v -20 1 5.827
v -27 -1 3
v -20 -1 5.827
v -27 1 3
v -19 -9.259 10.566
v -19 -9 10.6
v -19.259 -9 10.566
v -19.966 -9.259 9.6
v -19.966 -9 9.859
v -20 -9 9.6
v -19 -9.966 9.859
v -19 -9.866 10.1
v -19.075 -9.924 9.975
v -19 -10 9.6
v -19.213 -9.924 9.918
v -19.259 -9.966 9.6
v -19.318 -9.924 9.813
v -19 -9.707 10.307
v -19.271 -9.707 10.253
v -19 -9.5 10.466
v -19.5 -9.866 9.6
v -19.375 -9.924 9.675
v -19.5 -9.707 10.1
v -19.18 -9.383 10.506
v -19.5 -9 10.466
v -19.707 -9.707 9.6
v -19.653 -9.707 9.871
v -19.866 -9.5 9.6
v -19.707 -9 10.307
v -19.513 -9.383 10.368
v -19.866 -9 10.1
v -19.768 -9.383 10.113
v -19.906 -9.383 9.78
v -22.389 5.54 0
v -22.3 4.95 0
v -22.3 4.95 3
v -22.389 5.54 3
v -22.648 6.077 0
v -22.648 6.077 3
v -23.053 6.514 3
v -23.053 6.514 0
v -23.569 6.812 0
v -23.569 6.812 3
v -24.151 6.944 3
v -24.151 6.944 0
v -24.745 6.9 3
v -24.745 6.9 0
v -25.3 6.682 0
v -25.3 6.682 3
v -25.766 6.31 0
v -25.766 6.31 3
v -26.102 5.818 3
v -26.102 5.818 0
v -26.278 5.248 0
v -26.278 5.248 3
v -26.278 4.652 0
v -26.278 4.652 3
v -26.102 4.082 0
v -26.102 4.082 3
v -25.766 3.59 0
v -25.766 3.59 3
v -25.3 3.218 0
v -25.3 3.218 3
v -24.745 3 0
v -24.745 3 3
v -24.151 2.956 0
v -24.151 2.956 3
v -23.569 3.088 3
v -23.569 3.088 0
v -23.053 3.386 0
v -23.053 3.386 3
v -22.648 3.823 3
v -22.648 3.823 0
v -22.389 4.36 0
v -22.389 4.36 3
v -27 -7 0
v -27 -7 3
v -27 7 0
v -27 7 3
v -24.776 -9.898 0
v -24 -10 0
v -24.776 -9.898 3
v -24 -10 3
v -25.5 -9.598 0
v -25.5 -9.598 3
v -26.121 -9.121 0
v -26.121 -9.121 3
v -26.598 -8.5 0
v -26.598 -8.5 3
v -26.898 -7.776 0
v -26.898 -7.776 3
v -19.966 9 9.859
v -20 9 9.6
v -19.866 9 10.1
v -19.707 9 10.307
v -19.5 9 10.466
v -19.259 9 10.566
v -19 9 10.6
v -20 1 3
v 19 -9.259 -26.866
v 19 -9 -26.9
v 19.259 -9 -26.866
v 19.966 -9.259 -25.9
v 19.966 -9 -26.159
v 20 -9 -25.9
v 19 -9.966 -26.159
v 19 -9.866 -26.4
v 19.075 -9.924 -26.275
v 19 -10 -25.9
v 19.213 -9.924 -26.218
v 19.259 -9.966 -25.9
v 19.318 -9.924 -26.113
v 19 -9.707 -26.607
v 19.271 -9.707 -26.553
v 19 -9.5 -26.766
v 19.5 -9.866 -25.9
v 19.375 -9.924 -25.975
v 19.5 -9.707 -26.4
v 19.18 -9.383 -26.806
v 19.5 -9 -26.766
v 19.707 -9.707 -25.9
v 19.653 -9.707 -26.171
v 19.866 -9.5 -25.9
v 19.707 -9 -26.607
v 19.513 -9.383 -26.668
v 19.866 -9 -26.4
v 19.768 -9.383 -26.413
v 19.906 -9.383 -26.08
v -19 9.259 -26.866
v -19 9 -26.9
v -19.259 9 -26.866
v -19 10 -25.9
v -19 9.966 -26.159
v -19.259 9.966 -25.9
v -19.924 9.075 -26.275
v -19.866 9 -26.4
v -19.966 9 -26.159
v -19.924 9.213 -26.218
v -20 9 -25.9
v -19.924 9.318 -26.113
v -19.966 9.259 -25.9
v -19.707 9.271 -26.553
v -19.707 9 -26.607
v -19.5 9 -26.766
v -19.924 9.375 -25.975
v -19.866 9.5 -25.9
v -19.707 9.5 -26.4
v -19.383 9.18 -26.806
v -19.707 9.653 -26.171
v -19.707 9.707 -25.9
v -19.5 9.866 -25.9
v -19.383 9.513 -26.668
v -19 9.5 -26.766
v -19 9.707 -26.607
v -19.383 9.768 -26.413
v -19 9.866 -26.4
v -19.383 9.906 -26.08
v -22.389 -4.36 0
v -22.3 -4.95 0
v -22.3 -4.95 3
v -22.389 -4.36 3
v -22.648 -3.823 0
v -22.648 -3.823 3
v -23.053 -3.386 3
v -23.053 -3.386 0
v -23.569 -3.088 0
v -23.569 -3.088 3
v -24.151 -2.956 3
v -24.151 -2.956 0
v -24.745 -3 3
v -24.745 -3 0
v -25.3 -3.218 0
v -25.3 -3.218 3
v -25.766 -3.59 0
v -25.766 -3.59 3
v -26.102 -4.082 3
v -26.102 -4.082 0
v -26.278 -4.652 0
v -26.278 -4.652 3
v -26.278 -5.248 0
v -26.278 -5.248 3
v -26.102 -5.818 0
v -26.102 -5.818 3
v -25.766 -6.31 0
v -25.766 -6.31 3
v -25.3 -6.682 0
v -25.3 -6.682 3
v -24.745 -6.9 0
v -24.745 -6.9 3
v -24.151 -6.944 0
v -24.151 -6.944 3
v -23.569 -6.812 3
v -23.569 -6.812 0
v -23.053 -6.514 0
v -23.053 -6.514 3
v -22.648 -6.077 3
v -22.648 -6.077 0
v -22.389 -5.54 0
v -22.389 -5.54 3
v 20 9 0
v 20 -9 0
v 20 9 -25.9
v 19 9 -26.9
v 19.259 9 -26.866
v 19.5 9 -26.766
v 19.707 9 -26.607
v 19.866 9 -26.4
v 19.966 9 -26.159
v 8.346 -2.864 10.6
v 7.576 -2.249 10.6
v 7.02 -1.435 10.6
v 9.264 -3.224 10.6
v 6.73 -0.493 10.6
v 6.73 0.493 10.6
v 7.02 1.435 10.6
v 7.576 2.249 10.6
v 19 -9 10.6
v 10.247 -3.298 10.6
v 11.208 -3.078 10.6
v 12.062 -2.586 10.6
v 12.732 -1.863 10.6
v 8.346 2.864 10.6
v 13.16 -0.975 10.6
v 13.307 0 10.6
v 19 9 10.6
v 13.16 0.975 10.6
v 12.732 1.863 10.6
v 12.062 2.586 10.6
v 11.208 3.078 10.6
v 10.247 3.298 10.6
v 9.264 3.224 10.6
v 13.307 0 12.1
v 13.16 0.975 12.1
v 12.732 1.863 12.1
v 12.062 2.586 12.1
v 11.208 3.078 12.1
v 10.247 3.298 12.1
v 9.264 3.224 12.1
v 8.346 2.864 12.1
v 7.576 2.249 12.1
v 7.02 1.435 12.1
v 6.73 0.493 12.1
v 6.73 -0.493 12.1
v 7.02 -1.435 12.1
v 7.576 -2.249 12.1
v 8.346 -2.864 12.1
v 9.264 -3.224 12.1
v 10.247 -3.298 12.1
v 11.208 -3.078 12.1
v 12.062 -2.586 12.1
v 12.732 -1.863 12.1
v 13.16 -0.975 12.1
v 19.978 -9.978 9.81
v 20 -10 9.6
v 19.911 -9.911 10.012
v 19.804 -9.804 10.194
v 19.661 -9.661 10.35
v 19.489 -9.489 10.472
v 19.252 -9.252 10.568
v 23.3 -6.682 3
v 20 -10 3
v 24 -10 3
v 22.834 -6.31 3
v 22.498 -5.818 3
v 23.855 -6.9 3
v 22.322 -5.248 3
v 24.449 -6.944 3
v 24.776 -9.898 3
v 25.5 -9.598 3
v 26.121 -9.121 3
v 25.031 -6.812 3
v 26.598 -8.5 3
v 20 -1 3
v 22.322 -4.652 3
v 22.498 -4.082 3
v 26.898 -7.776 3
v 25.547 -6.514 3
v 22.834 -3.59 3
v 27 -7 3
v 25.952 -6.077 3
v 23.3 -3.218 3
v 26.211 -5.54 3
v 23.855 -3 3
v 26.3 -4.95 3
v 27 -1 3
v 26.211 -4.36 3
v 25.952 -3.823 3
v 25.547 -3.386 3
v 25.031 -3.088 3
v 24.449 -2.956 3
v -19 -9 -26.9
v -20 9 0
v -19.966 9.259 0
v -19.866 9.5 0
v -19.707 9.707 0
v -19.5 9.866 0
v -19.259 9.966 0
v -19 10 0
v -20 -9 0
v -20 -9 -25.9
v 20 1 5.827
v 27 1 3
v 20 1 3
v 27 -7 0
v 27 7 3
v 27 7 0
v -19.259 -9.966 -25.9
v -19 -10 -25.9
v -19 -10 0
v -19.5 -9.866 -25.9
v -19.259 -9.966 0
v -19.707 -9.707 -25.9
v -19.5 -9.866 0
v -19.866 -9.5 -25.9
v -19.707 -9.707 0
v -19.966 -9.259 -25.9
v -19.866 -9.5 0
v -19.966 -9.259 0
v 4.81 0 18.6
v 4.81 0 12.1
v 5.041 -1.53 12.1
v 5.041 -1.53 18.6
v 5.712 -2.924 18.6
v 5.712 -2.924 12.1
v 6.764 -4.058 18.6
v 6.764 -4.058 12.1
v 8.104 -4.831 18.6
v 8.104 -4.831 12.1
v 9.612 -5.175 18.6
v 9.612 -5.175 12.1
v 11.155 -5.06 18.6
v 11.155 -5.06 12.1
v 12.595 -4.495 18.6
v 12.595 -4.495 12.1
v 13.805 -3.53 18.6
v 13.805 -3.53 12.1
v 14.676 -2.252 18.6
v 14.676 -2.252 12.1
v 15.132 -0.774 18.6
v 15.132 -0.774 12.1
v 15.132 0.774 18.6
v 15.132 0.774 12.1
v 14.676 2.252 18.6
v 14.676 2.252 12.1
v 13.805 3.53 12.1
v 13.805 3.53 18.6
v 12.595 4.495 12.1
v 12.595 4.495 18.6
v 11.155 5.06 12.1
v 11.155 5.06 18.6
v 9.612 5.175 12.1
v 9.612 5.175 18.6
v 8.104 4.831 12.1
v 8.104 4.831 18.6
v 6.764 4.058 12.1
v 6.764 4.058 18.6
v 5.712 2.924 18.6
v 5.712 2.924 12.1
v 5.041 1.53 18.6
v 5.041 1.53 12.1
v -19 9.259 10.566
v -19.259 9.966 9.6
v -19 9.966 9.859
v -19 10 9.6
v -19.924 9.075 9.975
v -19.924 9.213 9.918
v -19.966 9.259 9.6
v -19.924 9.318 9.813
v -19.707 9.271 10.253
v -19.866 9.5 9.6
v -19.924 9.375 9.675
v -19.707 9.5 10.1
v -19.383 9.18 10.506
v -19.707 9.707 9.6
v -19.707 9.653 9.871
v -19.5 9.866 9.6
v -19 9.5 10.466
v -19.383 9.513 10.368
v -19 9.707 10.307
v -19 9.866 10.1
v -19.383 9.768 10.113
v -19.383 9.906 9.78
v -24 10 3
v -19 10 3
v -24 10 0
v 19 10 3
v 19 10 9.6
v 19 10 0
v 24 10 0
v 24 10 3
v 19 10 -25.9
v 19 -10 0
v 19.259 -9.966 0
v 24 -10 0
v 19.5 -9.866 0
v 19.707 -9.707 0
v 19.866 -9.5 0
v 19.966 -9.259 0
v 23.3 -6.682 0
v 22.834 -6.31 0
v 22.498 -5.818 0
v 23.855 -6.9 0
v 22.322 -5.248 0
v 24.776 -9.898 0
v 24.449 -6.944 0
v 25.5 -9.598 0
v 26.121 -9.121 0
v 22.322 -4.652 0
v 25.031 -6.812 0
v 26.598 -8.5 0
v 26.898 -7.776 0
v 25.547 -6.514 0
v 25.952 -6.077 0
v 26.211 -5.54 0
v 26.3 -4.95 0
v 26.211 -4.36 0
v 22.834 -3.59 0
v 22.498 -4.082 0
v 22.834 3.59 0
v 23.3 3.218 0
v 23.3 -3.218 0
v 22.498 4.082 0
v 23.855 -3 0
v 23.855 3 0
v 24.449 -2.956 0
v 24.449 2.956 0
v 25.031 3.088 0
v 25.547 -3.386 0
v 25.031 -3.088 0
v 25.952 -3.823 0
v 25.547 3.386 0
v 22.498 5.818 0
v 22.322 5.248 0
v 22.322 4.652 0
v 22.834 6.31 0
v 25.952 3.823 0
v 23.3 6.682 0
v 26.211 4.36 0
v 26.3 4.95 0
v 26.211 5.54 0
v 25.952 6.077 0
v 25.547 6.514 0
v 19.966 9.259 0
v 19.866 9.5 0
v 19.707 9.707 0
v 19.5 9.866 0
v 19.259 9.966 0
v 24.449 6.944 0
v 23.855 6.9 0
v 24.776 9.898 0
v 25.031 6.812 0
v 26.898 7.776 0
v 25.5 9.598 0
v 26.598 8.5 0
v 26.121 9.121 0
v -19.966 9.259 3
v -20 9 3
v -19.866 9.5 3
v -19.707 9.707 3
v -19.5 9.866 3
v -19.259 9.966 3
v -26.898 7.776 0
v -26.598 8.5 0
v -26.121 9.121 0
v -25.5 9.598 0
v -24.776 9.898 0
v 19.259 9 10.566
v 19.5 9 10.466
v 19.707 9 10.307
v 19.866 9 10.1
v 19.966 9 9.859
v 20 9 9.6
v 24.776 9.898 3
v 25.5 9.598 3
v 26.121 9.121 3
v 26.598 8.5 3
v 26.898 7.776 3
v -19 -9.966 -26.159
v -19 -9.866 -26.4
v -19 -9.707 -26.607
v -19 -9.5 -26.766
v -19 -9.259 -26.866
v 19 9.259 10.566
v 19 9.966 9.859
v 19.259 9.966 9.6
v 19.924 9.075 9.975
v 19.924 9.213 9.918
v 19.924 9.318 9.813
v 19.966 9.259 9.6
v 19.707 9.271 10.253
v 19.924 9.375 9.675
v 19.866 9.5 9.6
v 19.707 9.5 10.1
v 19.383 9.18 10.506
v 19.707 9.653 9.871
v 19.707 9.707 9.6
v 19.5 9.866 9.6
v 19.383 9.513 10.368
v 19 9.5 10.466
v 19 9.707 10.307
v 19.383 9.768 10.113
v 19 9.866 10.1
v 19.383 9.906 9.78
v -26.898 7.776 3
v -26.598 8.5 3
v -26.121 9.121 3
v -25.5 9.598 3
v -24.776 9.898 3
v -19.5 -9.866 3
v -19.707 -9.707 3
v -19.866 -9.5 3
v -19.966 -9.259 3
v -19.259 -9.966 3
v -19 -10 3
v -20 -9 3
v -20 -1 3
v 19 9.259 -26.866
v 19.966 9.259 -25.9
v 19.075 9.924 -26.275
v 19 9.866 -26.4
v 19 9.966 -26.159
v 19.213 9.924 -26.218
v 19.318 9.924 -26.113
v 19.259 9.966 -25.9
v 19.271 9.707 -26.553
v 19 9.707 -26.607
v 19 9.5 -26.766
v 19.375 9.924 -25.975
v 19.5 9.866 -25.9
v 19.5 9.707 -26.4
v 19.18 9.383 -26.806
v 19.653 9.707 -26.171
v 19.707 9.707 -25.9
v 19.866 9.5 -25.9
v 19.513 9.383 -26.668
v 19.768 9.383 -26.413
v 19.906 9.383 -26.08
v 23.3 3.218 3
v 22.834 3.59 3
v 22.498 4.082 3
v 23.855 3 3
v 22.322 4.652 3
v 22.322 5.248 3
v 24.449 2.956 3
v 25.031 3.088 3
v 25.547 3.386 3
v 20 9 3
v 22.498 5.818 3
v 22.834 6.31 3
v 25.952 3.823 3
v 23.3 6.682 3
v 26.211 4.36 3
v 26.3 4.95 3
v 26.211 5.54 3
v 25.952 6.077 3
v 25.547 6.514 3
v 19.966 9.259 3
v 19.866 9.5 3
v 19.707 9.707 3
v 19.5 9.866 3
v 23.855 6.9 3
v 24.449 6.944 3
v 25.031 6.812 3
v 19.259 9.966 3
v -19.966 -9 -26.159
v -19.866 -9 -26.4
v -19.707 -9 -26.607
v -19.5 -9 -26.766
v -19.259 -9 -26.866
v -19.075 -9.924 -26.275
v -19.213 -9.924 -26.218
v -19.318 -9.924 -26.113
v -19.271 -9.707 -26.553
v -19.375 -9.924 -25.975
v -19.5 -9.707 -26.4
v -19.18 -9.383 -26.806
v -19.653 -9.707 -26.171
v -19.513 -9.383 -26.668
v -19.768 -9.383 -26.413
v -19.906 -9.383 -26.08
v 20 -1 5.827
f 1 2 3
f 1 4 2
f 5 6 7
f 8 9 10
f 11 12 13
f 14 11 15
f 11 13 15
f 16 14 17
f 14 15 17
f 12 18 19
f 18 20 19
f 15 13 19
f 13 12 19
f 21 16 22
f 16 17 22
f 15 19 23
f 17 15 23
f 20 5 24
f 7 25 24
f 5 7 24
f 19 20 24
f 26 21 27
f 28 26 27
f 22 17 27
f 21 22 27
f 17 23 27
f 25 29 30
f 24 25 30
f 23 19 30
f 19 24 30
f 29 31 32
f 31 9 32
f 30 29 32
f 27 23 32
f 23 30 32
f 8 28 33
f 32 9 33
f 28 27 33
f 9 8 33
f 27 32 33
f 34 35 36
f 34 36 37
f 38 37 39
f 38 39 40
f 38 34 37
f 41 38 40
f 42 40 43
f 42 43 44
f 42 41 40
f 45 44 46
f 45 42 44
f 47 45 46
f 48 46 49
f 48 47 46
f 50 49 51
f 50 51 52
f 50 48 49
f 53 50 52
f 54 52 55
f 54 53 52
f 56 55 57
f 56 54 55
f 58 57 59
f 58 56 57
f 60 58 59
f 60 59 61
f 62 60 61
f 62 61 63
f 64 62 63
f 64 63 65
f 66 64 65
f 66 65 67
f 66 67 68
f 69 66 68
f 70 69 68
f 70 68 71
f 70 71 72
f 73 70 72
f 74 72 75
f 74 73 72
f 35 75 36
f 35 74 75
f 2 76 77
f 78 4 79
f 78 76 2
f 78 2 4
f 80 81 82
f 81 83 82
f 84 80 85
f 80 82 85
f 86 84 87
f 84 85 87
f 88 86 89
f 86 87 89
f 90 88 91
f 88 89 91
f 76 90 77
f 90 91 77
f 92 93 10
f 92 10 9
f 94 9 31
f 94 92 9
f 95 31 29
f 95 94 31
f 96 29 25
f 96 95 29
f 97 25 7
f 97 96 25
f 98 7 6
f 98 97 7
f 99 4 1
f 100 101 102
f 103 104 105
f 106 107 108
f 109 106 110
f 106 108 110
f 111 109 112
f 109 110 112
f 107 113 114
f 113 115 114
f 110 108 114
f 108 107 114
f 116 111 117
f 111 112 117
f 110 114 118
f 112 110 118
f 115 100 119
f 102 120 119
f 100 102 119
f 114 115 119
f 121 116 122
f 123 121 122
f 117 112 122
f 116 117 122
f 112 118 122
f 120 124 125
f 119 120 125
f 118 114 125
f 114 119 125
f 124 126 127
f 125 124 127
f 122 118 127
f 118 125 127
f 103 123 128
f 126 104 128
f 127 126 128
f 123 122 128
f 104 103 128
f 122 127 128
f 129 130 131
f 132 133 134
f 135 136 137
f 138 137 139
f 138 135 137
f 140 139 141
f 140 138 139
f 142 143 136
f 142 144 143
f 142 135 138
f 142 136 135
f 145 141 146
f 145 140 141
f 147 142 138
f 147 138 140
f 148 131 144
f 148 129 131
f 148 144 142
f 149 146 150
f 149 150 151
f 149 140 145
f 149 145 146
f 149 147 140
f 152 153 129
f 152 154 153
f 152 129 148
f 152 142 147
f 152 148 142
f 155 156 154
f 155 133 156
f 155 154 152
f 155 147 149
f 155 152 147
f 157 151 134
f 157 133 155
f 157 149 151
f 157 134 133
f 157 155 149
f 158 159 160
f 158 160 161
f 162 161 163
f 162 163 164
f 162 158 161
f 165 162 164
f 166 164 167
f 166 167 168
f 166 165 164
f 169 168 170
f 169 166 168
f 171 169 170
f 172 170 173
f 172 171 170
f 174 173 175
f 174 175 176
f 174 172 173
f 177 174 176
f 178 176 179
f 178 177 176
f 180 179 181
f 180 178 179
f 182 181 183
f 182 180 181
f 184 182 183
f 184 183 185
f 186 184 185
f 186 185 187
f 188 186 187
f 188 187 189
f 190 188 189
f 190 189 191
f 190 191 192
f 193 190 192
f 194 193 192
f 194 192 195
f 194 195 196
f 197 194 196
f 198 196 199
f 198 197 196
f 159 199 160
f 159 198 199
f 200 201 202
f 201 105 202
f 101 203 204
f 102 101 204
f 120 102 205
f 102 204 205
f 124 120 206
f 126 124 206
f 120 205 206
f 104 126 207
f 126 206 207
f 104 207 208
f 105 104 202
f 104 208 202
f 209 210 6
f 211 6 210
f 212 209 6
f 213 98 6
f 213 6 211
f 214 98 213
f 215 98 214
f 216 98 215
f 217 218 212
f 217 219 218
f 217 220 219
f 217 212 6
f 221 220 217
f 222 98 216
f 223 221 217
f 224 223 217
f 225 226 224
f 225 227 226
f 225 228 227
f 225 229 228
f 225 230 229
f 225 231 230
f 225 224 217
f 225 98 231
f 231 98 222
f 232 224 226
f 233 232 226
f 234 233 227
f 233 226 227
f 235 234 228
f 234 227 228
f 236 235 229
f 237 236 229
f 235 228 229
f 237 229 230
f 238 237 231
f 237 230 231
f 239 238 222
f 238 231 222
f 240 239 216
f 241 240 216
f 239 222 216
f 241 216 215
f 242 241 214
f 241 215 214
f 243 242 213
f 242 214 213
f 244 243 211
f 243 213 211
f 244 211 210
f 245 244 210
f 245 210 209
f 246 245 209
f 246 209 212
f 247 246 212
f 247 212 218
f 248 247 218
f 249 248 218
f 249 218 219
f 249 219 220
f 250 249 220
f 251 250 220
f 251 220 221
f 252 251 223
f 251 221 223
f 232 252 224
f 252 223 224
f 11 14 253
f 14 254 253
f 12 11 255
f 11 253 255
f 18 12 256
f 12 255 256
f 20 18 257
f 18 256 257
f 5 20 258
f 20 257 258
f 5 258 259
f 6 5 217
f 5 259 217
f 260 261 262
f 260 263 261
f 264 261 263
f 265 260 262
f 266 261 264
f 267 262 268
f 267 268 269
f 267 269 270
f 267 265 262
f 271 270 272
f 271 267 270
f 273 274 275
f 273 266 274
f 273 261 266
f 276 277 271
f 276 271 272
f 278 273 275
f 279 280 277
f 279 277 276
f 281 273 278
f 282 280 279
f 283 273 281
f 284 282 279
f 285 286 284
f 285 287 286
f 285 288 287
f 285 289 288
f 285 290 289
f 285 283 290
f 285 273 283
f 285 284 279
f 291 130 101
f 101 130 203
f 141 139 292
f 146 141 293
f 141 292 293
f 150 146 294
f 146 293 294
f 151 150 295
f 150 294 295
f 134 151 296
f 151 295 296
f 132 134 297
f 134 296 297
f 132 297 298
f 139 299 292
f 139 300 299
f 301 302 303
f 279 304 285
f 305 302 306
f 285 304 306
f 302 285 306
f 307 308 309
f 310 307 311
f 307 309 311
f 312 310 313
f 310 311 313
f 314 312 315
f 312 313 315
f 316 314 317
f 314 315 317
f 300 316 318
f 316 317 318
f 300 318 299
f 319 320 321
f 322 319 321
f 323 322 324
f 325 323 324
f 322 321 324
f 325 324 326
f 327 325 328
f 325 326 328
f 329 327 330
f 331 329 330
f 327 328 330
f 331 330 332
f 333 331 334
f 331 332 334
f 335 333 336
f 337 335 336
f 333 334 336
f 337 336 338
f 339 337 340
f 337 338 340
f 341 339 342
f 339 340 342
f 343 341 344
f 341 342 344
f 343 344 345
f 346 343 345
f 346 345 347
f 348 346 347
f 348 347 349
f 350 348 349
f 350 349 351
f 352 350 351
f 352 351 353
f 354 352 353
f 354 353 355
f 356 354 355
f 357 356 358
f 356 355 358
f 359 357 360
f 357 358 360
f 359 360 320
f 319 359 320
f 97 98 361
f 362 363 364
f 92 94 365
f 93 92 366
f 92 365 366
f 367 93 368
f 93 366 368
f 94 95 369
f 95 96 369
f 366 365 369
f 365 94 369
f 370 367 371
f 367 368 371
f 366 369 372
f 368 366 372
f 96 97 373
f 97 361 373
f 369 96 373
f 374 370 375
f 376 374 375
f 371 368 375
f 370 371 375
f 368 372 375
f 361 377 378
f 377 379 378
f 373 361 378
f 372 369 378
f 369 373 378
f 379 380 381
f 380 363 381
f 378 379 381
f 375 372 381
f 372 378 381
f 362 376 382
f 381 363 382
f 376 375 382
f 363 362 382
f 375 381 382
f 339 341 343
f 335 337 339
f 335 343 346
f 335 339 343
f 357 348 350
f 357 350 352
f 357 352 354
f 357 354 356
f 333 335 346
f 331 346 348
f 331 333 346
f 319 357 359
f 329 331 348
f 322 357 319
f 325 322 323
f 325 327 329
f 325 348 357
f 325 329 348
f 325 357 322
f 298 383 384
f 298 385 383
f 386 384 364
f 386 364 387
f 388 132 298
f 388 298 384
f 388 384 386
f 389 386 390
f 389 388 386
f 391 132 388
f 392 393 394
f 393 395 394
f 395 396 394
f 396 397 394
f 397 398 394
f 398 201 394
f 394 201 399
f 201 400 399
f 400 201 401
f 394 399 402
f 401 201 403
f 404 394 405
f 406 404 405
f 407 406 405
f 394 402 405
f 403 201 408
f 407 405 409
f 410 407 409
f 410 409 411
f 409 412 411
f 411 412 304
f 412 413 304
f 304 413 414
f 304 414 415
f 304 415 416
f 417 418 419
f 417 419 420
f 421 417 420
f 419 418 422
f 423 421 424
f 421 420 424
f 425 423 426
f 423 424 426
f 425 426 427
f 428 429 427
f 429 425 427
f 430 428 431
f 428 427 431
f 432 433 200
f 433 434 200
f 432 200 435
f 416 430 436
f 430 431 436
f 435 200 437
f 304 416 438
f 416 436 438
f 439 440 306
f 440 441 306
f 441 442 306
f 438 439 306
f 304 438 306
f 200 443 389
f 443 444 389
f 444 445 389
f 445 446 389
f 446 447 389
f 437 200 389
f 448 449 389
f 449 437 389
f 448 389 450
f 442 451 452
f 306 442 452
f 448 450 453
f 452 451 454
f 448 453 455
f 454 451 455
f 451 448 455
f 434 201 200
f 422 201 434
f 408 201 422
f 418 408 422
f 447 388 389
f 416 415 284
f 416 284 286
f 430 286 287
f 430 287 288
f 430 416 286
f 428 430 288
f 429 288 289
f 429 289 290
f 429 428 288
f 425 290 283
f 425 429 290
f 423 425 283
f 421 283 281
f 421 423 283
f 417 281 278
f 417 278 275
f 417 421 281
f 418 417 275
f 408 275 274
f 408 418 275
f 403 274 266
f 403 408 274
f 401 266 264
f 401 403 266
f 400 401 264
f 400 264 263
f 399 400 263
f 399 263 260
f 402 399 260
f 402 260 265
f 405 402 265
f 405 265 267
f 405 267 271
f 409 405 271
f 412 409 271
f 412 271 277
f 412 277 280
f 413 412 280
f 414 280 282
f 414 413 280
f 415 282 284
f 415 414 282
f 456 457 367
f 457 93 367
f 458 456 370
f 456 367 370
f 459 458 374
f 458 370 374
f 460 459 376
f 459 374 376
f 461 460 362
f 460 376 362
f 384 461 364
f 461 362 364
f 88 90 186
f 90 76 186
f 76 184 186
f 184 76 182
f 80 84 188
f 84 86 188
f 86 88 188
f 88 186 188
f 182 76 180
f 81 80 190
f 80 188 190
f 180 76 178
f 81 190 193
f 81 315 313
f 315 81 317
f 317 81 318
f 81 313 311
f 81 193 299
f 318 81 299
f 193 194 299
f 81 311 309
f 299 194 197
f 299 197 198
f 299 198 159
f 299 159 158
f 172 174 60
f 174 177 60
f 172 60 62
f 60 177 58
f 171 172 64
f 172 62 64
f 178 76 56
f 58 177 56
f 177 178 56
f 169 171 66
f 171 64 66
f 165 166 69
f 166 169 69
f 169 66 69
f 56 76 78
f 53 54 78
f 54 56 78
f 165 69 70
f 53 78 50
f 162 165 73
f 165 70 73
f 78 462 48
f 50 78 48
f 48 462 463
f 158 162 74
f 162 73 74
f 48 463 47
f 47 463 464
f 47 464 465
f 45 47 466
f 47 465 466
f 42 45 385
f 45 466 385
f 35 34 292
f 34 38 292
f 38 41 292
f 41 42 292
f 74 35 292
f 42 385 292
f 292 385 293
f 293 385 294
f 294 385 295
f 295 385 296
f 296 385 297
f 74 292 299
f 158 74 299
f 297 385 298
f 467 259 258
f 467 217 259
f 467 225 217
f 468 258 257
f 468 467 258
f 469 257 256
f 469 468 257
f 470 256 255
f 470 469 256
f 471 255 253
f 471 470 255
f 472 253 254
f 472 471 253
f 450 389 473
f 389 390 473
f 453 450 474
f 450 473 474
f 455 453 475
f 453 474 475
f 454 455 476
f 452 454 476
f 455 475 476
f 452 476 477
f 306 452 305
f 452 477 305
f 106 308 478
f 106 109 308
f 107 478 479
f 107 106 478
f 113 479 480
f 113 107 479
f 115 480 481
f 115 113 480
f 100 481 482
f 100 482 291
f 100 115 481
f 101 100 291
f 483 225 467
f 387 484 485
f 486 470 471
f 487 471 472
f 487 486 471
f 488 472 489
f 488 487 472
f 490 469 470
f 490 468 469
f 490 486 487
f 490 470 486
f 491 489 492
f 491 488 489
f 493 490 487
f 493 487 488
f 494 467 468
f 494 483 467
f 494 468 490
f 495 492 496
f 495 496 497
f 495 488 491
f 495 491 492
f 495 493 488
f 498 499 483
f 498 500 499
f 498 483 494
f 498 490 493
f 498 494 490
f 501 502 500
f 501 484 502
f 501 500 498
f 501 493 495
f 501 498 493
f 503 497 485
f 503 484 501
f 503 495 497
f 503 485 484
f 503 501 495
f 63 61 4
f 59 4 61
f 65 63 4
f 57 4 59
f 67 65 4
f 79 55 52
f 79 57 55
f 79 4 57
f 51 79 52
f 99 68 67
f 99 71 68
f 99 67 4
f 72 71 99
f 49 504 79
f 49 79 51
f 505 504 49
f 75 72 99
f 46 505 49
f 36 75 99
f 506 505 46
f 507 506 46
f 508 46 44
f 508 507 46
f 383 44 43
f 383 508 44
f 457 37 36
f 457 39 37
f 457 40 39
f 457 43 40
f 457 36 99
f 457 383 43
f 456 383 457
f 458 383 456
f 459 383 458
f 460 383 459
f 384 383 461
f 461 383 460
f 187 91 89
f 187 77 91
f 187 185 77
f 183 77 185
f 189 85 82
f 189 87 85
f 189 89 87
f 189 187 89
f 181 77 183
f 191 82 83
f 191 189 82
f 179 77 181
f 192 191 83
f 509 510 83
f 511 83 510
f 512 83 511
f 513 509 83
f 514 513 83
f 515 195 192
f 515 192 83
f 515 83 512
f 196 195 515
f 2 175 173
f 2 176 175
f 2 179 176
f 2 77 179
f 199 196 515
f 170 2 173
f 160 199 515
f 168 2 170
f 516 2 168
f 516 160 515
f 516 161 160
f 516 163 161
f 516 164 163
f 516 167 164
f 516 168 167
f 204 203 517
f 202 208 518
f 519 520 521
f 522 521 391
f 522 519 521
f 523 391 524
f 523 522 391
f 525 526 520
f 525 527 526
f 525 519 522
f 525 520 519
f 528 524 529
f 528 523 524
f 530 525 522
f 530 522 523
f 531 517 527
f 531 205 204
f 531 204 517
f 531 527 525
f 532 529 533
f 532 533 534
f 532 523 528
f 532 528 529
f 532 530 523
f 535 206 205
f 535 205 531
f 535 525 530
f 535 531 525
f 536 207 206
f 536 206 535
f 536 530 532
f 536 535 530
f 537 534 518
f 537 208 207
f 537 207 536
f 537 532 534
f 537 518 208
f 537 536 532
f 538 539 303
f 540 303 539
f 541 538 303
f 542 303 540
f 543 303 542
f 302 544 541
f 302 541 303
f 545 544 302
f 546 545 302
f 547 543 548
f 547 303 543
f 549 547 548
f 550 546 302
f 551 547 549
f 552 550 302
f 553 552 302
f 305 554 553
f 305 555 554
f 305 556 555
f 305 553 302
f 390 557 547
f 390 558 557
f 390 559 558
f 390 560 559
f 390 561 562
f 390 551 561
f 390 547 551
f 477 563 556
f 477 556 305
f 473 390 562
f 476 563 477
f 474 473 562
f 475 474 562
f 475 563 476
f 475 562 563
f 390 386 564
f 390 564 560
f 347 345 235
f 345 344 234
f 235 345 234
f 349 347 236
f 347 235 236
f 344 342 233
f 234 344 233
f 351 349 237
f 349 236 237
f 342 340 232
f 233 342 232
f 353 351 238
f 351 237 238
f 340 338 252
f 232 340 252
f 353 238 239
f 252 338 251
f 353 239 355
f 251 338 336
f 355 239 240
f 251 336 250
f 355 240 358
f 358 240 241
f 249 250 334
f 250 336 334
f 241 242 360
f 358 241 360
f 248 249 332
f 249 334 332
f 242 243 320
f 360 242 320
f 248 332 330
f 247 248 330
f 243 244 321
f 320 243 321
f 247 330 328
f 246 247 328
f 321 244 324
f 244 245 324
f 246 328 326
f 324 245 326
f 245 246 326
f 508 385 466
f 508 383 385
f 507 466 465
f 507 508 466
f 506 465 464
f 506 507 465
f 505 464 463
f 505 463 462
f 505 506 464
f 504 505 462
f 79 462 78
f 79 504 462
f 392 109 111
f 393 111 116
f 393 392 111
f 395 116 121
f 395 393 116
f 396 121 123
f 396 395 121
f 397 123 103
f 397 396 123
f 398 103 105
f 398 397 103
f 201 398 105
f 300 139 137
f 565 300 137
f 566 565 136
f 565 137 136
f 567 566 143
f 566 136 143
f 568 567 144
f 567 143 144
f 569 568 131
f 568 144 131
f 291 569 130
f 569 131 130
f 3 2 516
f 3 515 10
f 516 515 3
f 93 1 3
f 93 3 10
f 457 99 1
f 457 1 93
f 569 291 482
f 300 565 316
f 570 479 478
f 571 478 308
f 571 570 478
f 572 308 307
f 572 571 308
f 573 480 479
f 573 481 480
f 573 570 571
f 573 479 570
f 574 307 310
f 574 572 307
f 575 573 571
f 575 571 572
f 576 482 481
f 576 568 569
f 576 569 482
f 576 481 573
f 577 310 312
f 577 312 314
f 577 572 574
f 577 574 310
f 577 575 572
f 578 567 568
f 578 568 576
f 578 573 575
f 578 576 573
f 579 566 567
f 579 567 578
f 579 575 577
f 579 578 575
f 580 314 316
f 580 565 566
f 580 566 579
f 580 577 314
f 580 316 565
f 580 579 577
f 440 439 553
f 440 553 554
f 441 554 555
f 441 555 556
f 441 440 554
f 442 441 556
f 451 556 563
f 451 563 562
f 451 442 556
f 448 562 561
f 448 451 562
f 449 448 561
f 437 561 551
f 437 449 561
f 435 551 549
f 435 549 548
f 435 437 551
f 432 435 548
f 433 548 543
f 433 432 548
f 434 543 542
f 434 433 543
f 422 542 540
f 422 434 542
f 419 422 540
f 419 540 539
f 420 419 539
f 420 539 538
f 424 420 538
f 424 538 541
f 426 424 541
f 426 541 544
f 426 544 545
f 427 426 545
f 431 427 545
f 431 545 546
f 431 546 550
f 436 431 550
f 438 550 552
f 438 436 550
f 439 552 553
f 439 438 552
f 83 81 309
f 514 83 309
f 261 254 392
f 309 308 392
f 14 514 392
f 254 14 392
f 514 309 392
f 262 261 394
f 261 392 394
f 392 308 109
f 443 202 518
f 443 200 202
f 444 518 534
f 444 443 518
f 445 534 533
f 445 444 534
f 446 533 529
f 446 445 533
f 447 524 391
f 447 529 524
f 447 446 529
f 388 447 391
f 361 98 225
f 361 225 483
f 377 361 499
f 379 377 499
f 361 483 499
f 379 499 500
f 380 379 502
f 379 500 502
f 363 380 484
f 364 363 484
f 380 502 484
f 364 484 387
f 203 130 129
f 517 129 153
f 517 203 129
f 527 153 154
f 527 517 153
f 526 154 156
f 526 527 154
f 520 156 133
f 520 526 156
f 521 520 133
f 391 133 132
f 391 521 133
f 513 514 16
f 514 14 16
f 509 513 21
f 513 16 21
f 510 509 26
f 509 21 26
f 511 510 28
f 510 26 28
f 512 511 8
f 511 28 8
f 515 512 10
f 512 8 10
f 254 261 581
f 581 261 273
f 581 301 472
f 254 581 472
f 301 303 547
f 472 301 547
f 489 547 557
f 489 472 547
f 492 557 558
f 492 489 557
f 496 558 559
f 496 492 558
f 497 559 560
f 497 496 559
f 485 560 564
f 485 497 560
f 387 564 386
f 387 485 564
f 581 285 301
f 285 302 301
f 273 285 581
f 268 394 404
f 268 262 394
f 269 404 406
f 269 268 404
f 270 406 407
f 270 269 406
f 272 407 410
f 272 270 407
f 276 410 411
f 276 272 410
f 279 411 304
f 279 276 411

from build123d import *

# Parameters (mm, degrees)
BOSS_EXTRUDE1_DEPTH      = 10.6
BOSS_EXTRUDE1_DEPTH_BACK = 26.9
SKETCH1_W                = 40
SKETCH1_H                = 20
SKETCH1_3_W              = 40
SKETCH1_3_H              = 20
SKETCH1_3_W_2            = 7
SKETCH1_3_R              = 2
BOSS_EXTRUDE2_DEPTH      = 3
SKETCH2_R                = 3.307057182
BOSS_EXTRUDE3_DEPTH      = 1.5
BOSS_EXTRUDE4_START      = 1.5
SKETCH2_3_R              = 5.189986332
SKETCH2_3_R_2            = 3.307057182
BOSS_EXTRUDE4_DEPTH      = 6.5
FILLET1_R                = 3
FILLET2_R                = 1
BOSS_EXTRUDE6_DEPTH      = 1


with BuildPart() as part:
    # Sketch1 → Boss-Extrude1 (new, two sides: drawn at the far end of the back side and taken through both)
    with BuildSketch(Plane.XY.offset(-BOSS_EXTRUDE1_DEPTH_BACK)):
        Rectangle(SKETCH1_W, SKETCH1_H)
    extrude(amount=BOSS_EXTRUDE1_DEPTH + BOSS_EXTRUDE1_DEPTH_BACK)

    # Sketch1<3> → Boss-Extrude2 (add)
    # profile 1 of 3: a face of its own
    with BuildSketch(Plane.XY):
        Rectangle(SKETCH1_3_W, SKETCH1_3_H)
    # profile 2 of 3: a face of its own
    with BuildSketch(Plane.XY):
        with Locations((-23.5, 0)):
            Rectangle(SKETCH1_3_W_2, SKETCH1_3_H)
        with Locations((-24.3, -4.95)):
            Circle(SKETCH1_3_R, mode=Mode.SUBTRACT)
        with Locations((-24.3, 4.95)):
            Circle(SKETCH1_3_R, mode=Mode.SUBTRACT)
    # profile 3 of 3: a face of its own
    with BuildSketch(Plane.XY):
        with Locations((23.5, 0)):
            Rectangle(SKETCH1_3_W_2, SKETCH1_3_H)
        with Locations((24.3, -4.95)):
            Circle(SKETCH1_3_R, mode=Mode.SUBTRACT)
        with Locations((24.3, 4.95)):
            Circle(SKETCH1_3_R, mode=Mode.SUBTRACT)
    extrude(amount=BOSS_EXTRUDE2_DEPTH)

    # Sketch2 → Boss-Extrude3 (add)
    with BuildSketch(Plane.XY.offset(10.6)):
        with Locations((10, 0)):
            Circle(SKETCH2_R)
    extrude(amount=BOSS_EXTRUDE3_DEPTH)

    # Sketch2<3> → Boss-Extrude4 (add)
    # profile 1 of 2: a face of its own
    with BuildSketch(Plane.XY.offset(10.6).offset(BOSS_EXTRUDE4_START)):
        with Locations(Location((10, 0, 0), (0, 0, 180))):
            Circle(SKETCH2_3_R)
        with Locations((10, 0)):
            Circle(SKETCH2_3_R_2, mode=Mode.SUBTRACT)
    # profile 2 of 2: a face of its own
    with BuildSketch(Plane.XY.offset(10.6).offset(BOSS_EXTRUDE4_START)):
        with Locations((10, 0)):
            Circle(SKETCH2_3_R_2)
    extrude(amount=BOSS_EXTRUDE4_DEPTH)

    # Fillet1
    fillet1_edges = [part.edges().sort_by_distance(p)[0] for p in [
        (-27, 10, 1.5),
        (-27, -10, 1.5),
        (27, -10, 1.5),
        (27, 10, 1.5),
    ]]
    fillet(fillet1_edges, radius=FILLET1_R)

    # Fillet2
    fillet2_edges = [part.edges().sort_by_distance(p)[0] for p in [
        (20, 0, -26.9),
        (0, 10, 10.6),
        (-20, 0, 10.6),
        (0, -10, 10.6),
        (20, 0, 10.6),
        (0, 10, -26.9),
        (-20, 0, -26.9),
        (-20, -10, 6.8),
        (-20, 10, 6.8),
        (20, 10, 6.8),
        (0, -10, -26.9),
        (-20, -10, -13.45),
        (-20, 10, -13.45),
        (20, 10, -13.45),
        (20, -10, -13.45),
    ]]
    fillet(fillet2_edges, radius=FILLET2_R)

    # Sketch4 → Boss-Extrude6 (add, symmetric)
    with BuildSketch(Plane(origin=(0, 0, 0), x_dir=(1, 0, 0), z_dir=(0, 1, 0))):
        Polygon((-27, -3), (-20, -5.826634937), (-20, -3), align=None)
    boss_extrude6 = extrude(amount=BOSS_EXTRUDE6_DEPTH, both=True)

    # Mirror1: Boss-Extrude6 across plane
    add(boss_extrude6.mirror(Plane(origin=(0, 0, 0), x_dir=(0, 0, 1), z_dir=(1, 0, 0))))


solid = part.part
